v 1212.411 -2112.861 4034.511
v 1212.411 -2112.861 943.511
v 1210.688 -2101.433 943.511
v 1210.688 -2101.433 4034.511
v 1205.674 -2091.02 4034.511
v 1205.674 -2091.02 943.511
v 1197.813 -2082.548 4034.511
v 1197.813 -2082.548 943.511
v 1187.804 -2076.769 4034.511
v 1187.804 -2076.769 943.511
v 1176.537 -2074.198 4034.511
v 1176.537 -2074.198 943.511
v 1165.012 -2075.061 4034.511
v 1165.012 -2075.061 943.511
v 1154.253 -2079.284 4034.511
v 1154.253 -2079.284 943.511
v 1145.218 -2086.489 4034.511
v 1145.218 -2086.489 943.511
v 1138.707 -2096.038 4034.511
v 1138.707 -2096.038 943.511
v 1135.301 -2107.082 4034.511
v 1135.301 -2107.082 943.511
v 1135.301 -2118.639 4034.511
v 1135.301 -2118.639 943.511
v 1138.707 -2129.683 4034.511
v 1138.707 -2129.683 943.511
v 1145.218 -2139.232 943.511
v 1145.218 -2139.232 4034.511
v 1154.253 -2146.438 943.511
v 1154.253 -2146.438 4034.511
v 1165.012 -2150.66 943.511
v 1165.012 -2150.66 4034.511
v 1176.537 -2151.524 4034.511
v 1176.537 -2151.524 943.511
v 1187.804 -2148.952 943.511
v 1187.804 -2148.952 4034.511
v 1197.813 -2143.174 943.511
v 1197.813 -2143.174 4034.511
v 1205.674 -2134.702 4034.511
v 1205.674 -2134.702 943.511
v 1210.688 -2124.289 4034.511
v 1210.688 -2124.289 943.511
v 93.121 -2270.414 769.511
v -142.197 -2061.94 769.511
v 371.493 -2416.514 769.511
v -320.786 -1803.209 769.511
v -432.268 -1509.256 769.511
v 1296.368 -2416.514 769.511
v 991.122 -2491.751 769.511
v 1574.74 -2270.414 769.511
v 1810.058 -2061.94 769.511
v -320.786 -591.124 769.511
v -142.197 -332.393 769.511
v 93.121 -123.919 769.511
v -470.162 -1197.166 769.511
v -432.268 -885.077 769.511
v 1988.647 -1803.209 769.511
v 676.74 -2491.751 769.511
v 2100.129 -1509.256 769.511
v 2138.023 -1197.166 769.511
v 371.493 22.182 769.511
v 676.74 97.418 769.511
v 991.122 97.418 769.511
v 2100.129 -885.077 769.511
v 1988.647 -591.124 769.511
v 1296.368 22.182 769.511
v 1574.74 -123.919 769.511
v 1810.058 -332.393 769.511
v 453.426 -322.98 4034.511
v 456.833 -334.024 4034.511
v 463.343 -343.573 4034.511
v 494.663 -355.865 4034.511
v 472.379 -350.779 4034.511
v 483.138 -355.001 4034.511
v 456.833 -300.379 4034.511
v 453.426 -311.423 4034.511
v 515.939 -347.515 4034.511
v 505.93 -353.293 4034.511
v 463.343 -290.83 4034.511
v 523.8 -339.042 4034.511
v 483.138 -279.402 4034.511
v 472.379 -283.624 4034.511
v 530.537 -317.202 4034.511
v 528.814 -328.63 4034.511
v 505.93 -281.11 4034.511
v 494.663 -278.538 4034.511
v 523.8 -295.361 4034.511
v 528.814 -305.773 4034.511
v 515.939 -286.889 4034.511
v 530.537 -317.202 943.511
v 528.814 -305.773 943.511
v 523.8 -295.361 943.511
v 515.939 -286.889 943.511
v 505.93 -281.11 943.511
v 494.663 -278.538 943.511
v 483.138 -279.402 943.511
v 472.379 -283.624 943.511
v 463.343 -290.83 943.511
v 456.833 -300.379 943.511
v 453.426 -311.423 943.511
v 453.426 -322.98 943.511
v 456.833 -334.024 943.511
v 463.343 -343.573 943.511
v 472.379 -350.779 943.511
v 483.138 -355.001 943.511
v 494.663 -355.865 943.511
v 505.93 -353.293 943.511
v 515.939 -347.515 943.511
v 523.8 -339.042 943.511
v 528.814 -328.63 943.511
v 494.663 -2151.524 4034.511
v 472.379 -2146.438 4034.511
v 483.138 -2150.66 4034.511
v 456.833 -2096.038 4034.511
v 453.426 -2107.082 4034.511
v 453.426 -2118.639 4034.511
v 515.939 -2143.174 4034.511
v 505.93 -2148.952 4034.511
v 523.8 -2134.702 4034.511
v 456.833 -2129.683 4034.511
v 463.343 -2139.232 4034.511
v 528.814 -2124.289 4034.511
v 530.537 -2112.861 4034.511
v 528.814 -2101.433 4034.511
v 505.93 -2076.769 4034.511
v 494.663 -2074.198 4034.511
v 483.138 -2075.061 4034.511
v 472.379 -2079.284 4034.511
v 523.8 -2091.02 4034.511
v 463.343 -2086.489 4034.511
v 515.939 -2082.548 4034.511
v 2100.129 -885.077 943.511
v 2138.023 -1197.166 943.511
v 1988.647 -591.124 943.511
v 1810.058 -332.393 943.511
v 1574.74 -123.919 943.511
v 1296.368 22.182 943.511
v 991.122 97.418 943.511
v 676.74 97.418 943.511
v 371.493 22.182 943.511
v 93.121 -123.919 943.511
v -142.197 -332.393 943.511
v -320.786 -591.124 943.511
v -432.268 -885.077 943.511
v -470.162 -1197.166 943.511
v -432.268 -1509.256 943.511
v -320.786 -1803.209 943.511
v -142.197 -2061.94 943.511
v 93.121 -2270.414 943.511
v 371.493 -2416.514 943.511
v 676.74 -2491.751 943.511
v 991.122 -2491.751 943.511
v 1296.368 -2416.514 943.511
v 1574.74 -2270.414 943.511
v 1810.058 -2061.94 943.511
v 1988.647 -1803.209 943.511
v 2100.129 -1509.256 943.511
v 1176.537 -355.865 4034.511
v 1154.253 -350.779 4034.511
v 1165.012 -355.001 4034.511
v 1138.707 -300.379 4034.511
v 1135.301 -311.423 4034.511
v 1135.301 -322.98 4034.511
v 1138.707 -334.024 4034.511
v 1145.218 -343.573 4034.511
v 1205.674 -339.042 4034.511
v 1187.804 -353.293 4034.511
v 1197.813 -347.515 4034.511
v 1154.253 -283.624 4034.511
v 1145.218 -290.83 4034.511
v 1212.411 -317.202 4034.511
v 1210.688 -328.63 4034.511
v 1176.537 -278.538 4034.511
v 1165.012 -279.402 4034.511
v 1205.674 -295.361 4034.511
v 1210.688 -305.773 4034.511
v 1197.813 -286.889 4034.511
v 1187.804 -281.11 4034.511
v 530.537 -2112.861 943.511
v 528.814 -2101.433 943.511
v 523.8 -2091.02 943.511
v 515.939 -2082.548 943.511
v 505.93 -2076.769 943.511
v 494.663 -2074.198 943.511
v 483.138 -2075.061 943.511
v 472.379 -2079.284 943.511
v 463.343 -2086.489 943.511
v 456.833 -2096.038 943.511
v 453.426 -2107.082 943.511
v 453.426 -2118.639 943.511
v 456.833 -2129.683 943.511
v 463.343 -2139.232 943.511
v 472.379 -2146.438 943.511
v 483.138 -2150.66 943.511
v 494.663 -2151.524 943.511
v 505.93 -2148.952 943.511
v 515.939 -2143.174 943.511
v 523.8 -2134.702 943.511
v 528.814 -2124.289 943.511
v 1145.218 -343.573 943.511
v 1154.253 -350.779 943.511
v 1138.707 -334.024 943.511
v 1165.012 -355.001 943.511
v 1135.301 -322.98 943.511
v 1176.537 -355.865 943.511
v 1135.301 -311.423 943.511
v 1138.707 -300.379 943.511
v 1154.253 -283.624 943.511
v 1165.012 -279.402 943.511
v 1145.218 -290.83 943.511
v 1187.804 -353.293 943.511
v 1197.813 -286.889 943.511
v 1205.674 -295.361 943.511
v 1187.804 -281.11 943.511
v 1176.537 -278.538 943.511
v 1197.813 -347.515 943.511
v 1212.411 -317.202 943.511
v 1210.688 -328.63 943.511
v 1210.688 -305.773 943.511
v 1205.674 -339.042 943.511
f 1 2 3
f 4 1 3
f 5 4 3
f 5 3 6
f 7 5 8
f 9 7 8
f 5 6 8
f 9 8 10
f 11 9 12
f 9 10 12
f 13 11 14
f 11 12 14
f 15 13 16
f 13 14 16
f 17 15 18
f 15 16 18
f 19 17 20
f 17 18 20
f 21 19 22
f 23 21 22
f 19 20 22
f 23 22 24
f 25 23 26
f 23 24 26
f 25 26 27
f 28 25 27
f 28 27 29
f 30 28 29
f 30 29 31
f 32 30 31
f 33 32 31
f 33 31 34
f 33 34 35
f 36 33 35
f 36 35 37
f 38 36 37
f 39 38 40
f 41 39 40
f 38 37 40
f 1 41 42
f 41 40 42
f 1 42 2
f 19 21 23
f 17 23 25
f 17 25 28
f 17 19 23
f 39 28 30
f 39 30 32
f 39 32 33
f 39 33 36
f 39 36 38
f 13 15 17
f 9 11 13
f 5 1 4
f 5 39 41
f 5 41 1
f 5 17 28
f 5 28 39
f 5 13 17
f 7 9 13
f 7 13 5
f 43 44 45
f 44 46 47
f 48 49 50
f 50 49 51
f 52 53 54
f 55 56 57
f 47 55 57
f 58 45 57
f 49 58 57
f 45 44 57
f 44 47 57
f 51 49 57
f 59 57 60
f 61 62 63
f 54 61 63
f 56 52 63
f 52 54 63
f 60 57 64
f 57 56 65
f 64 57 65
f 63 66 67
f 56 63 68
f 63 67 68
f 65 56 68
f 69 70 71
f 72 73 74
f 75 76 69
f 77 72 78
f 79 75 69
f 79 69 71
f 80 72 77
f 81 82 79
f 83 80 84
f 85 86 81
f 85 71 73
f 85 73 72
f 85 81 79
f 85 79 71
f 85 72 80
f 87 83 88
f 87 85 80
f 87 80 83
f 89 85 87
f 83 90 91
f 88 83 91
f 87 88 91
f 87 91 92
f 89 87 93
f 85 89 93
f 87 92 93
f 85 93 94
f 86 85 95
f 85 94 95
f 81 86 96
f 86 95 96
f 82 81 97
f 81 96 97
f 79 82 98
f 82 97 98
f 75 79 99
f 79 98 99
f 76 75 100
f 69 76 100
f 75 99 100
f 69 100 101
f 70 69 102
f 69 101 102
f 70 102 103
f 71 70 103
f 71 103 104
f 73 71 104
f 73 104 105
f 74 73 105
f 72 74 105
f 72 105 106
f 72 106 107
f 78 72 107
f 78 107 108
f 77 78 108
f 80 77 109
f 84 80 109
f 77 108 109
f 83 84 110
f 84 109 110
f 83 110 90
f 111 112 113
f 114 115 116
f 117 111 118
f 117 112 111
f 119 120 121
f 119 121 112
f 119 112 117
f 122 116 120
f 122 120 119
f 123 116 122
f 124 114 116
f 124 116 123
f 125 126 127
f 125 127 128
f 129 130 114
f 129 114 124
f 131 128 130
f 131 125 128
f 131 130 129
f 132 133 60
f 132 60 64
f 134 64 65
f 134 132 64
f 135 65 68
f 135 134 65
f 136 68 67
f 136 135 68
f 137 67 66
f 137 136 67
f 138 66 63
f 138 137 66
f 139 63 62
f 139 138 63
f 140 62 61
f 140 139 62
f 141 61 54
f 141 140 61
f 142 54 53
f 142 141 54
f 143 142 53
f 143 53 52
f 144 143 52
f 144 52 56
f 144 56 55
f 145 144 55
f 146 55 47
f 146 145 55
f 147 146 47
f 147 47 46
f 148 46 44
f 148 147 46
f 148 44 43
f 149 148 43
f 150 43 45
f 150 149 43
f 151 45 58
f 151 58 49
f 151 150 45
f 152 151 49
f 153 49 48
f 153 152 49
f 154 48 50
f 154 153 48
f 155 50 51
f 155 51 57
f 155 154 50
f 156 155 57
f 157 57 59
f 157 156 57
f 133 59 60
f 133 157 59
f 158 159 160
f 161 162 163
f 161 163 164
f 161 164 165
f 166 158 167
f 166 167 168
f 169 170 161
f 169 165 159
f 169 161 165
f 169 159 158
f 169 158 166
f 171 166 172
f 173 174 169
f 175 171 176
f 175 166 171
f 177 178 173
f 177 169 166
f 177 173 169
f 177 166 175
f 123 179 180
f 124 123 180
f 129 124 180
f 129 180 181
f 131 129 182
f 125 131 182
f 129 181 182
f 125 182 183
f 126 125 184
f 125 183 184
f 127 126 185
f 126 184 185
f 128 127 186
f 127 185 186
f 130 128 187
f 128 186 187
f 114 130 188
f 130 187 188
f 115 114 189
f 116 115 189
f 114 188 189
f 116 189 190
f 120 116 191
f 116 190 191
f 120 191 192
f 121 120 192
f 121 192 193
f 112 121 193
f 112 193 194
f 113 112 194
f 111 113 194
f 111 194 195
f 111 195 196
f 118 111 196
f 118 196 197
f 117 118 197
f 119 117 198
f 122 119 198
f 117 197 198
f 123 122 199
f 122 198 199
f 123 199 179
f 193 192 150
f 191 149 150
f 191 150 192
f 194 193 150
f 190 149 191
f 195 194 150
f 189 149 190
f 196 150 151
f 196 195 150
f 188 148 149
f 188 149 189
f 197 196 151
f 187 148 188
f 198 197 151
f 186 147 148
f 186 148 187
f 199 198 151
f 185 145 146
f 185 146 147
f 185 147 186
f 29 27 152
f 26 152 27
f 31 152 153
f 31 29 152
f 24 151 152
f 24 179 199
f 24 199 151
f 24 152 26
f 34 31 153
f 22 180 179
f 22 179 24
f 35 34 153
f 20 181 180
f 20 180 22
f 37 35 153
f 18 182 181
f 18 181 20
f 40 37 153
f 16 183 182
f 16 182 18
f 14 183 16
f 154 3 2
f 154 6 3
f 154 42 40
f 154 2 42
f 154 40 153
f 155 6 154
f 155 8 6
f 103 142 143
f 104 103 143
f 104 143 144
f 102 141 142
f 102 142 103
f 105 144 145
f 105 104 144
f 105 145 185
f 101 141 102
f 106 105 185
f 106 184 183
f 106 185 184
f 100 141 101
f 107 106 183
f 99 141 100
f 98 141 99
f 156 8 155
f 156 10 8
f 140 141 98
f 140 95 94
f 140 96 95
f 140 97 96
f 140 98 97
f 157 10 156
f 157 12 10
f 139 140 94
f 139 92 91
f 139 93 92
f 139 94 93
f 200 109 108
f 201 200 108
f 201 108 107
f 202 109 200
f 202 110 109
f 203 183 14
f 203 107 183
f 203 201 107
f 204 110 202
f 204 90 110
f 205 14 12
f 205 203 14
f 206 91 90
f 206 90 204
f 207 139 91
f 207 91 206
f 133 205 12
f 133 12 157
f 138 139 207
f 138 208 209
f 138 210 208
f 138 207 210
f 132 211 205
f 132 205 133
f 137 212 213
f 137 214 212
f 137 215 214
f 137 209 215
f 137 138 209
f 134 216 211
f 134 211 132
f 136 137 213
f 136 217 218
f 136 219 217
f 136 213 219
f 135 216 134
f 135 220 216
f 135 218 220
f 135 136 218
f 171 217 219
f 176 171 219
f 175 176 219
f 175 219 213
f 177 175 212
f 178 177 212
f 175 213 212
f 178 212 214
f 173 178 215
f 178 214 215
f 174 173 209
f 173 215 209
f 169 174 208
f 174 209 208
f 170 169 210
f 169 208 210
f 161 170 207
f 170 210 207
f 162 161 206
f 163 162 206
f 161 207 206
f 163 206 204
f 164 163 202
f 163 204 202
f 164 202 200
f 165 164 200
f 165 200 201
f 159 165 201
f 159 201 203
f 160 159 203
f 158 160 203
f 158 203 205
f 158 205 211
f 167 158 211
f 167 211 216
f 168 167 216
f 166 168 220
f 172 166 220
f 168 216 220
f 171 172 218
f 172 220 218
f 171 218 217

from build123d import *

# Parameters (mm, degrees)
SKETCH1_R           = 1304.092779863
BOSS_EXTRUDE1_DEPTH = 174
SKETCH3_R           = 38.771715285
SKETCH3_R_2         = 38.771715
BOSS_EXTRUDE2_DEPTH = 3091


with BuildPart() as part:
    # Sketch1 → Boss-Extrude1 (new body)
    with BuildSketch(Plane.XY.offset(943.510776168)):
        with Locations((833.930631376, -1197.16637306)):
            Circle(SKETCH1_R)
    extrude(amount=-BOSS_EXTRUDE1_DEPTH)

    # Sketch3 → Boss-Extrude2 (add)
    with BuildSketch(Plane.XY.offset(943.510776168)):
        with Locations((1173.639225527, -317.201613393)):
            Circle(SKETCH3_R)
        with Locations((491.765116758, -317.201613393)):
            Circle(SKETCH3_R_2)
        with Locations((491.765116758, -2112.860849235)):
            Circle(SKETCH3_R_2)
        with Locations((1173.639225527, -2112.860849235)):
            Circle(SKETCH3_R_2)
    extrude(amount=BOSS_EXTRUDE2_DEPTH)


solid = part.part
